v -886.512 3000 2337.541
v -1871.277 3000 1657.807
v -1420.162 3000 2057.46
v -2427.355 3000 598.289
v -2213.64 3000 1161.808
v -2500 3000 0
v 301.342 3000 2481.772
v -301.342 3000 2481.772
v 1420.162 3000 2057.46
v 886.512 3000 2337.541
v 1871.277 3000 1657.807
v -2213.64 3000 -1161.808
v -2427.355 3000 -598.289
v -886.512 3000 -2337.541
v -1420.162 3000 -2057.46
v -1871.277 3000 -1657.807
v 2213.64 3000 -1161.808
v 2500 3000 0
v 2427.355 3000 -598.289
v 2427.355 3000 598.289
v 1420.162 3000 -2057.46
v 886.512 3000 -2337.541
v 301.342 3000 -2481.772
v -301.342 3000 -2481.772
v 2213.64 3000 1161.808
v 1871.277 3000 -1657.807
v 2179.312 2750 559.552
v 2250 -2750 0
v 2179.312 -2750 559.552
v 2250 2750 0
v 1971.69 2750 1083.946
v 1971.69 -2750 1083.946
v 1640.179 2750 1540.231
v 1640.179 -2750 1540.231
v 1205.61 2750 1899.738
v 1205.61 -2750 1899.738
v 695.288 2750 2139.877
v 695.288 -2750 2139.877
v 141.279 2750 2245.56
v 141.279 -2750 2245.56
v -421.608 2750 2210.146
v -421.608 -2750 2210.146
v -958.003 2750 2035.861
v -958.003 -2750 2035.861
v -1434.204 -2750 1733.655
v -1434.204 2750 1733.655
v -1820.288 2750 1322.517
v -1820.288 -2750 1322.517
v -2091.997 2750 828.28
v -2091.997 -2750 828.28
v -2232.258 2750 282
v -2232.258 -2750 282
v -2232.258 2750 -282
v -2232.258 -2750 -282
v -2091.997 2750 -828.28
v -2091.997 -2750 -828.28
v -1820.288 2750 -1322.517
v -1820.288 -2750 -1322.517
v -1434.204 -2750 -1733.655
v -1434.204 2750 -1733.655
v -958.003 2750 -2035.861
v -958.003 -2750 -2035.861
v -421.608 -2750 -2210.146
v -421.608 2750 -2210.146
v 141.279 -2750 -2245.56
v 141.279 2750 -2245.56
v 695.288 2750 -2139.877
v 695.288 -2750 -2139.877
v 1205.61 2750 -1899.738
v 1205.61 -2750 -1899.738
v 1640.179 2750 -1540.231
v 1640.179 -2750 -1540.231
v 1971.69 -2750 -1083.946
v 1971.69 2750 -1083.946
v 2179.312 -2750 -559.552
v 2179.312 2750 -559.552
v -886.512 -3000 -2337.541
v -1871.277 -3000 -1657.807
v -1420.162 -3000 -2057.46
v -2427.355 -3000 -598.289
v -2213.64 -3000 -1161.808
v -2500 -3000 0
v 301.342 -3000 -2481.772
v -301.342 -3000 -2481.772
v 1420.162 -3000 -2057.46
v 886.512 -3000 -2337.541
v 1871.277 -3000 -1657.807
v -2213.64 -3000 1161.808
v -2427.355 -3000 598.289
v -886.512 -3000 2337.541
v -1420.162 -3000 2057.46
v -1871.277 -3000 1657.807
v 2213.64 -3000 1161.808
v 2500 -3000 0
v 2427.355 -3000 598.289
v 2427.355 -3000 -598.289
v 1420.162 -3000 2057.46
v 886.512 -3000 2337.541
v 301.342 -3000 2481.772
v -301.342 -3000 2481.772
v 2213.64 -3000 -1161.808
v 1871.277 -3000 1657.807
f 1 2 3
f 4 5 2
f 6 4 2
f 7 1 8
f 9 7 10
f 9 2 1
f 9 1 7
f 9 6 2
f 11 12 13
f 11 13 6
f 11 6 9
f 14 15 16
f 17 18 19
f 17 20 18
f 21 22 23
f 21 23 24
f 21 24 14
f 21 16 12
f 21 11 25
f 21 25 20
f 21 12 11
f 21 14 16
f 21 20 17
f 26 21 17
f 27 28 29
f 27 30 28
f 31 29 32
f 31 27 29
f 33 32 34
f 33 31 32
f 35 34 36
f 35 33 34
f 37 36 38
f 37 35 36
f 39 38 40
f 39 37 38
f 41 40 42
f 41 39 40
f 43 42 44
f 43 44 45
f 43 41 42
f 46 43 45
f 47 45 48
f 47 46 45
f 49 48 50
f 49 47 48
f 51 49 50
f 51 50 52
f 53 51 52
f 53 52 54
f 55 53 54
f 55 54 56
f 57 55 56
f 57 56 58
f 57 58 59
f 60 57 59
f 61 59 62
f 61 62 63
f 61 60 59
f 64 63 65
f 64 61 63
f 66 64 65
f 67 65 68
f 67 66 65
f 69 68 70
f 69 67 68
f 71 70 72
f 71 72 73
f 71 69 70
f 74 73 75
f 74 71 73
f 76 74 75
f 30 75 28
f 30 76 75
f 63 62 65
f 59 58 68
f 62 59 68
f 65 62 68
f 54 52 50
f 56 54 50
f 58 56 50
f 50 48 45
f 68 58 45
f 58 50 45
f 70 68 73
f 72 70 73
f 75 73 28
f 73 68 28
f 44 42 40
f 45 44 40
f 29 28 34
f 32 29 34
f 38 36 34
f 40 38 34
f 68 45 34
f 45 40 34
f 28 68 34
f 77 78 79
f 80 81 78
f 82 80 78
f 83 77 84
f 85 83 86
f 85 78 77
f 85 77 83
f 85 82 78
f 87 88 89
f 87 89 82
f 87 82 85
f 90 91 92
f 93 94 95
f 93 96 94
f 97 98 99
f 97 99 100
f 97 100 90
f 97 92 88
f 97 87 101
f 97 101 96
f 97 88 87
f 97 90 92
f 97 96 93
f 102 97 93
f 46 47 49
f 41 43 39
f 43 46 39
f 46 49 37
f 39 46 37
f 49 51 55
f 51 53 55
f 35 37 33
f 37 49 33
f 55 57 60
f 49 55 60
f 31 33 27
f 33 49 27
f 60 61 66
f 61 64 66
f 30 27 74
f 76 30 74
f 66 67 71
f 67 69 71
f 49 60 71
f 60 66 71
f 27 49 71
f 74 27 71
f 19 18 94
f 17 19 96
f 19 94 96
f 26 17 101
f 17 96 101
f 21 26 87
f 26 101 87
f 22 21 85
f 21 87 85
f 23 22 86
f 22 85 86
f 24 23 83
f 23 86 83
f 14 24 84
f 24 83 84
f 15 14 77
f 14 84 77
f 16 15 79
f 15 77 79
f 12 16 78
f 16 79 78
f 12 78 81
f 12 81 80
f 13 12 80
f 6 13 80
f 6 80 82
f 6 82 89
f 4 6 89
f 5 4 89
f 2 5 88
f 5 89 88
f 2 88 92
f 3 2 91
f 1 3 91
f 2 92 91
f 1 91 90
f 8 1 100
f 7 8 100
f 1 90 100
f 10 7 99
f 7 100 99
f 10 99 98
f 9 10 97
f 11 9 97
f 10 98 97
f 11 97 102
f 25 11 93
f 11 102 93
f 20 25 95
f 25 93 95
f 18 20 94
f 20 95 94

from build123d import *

# Parameters (mm, degrees)
SKETCH005_R   = 2500
SKETCH005_R_2 = 2250
PAD003_DEPTH  = 2750
SKETCH006_R   = 2500
PAD004_DEPTH  = 250
SKETCH007_R   = 2500
PAD005_DEPTH  = 250


with BuildPart() as part:
    # Sketch005 → Pad003 (new body, symmetric)
    with BuildSketch(Plane.XZ):
        Circle(SKETCH005_R)
        Circle(SKETCH005_R_2, mode=Mode.SUBTRACT)
    extrude(amount=PAD003_DEPTH, both=True)

    # Sketch006 (on Face4 of Pad003) → Pad004 (join)
    with BuildSketch(Plane.XZ.offset(2750)):
        Circle(SKETCH006_R)
    extrude(amount=PAD004_DEPTH)

    # Sketch007 (on Face1 of Pad004) → Pad005 (join)
    with BuildSketch(Plane(origin=(0, 2750, 0), x_dir=(1, 0, 0), z_dir=(0, 1, 0))):
        Circle(SKETCH007_R)
    extrude(amount=PAD005_DEPTH)


solid = part.part
